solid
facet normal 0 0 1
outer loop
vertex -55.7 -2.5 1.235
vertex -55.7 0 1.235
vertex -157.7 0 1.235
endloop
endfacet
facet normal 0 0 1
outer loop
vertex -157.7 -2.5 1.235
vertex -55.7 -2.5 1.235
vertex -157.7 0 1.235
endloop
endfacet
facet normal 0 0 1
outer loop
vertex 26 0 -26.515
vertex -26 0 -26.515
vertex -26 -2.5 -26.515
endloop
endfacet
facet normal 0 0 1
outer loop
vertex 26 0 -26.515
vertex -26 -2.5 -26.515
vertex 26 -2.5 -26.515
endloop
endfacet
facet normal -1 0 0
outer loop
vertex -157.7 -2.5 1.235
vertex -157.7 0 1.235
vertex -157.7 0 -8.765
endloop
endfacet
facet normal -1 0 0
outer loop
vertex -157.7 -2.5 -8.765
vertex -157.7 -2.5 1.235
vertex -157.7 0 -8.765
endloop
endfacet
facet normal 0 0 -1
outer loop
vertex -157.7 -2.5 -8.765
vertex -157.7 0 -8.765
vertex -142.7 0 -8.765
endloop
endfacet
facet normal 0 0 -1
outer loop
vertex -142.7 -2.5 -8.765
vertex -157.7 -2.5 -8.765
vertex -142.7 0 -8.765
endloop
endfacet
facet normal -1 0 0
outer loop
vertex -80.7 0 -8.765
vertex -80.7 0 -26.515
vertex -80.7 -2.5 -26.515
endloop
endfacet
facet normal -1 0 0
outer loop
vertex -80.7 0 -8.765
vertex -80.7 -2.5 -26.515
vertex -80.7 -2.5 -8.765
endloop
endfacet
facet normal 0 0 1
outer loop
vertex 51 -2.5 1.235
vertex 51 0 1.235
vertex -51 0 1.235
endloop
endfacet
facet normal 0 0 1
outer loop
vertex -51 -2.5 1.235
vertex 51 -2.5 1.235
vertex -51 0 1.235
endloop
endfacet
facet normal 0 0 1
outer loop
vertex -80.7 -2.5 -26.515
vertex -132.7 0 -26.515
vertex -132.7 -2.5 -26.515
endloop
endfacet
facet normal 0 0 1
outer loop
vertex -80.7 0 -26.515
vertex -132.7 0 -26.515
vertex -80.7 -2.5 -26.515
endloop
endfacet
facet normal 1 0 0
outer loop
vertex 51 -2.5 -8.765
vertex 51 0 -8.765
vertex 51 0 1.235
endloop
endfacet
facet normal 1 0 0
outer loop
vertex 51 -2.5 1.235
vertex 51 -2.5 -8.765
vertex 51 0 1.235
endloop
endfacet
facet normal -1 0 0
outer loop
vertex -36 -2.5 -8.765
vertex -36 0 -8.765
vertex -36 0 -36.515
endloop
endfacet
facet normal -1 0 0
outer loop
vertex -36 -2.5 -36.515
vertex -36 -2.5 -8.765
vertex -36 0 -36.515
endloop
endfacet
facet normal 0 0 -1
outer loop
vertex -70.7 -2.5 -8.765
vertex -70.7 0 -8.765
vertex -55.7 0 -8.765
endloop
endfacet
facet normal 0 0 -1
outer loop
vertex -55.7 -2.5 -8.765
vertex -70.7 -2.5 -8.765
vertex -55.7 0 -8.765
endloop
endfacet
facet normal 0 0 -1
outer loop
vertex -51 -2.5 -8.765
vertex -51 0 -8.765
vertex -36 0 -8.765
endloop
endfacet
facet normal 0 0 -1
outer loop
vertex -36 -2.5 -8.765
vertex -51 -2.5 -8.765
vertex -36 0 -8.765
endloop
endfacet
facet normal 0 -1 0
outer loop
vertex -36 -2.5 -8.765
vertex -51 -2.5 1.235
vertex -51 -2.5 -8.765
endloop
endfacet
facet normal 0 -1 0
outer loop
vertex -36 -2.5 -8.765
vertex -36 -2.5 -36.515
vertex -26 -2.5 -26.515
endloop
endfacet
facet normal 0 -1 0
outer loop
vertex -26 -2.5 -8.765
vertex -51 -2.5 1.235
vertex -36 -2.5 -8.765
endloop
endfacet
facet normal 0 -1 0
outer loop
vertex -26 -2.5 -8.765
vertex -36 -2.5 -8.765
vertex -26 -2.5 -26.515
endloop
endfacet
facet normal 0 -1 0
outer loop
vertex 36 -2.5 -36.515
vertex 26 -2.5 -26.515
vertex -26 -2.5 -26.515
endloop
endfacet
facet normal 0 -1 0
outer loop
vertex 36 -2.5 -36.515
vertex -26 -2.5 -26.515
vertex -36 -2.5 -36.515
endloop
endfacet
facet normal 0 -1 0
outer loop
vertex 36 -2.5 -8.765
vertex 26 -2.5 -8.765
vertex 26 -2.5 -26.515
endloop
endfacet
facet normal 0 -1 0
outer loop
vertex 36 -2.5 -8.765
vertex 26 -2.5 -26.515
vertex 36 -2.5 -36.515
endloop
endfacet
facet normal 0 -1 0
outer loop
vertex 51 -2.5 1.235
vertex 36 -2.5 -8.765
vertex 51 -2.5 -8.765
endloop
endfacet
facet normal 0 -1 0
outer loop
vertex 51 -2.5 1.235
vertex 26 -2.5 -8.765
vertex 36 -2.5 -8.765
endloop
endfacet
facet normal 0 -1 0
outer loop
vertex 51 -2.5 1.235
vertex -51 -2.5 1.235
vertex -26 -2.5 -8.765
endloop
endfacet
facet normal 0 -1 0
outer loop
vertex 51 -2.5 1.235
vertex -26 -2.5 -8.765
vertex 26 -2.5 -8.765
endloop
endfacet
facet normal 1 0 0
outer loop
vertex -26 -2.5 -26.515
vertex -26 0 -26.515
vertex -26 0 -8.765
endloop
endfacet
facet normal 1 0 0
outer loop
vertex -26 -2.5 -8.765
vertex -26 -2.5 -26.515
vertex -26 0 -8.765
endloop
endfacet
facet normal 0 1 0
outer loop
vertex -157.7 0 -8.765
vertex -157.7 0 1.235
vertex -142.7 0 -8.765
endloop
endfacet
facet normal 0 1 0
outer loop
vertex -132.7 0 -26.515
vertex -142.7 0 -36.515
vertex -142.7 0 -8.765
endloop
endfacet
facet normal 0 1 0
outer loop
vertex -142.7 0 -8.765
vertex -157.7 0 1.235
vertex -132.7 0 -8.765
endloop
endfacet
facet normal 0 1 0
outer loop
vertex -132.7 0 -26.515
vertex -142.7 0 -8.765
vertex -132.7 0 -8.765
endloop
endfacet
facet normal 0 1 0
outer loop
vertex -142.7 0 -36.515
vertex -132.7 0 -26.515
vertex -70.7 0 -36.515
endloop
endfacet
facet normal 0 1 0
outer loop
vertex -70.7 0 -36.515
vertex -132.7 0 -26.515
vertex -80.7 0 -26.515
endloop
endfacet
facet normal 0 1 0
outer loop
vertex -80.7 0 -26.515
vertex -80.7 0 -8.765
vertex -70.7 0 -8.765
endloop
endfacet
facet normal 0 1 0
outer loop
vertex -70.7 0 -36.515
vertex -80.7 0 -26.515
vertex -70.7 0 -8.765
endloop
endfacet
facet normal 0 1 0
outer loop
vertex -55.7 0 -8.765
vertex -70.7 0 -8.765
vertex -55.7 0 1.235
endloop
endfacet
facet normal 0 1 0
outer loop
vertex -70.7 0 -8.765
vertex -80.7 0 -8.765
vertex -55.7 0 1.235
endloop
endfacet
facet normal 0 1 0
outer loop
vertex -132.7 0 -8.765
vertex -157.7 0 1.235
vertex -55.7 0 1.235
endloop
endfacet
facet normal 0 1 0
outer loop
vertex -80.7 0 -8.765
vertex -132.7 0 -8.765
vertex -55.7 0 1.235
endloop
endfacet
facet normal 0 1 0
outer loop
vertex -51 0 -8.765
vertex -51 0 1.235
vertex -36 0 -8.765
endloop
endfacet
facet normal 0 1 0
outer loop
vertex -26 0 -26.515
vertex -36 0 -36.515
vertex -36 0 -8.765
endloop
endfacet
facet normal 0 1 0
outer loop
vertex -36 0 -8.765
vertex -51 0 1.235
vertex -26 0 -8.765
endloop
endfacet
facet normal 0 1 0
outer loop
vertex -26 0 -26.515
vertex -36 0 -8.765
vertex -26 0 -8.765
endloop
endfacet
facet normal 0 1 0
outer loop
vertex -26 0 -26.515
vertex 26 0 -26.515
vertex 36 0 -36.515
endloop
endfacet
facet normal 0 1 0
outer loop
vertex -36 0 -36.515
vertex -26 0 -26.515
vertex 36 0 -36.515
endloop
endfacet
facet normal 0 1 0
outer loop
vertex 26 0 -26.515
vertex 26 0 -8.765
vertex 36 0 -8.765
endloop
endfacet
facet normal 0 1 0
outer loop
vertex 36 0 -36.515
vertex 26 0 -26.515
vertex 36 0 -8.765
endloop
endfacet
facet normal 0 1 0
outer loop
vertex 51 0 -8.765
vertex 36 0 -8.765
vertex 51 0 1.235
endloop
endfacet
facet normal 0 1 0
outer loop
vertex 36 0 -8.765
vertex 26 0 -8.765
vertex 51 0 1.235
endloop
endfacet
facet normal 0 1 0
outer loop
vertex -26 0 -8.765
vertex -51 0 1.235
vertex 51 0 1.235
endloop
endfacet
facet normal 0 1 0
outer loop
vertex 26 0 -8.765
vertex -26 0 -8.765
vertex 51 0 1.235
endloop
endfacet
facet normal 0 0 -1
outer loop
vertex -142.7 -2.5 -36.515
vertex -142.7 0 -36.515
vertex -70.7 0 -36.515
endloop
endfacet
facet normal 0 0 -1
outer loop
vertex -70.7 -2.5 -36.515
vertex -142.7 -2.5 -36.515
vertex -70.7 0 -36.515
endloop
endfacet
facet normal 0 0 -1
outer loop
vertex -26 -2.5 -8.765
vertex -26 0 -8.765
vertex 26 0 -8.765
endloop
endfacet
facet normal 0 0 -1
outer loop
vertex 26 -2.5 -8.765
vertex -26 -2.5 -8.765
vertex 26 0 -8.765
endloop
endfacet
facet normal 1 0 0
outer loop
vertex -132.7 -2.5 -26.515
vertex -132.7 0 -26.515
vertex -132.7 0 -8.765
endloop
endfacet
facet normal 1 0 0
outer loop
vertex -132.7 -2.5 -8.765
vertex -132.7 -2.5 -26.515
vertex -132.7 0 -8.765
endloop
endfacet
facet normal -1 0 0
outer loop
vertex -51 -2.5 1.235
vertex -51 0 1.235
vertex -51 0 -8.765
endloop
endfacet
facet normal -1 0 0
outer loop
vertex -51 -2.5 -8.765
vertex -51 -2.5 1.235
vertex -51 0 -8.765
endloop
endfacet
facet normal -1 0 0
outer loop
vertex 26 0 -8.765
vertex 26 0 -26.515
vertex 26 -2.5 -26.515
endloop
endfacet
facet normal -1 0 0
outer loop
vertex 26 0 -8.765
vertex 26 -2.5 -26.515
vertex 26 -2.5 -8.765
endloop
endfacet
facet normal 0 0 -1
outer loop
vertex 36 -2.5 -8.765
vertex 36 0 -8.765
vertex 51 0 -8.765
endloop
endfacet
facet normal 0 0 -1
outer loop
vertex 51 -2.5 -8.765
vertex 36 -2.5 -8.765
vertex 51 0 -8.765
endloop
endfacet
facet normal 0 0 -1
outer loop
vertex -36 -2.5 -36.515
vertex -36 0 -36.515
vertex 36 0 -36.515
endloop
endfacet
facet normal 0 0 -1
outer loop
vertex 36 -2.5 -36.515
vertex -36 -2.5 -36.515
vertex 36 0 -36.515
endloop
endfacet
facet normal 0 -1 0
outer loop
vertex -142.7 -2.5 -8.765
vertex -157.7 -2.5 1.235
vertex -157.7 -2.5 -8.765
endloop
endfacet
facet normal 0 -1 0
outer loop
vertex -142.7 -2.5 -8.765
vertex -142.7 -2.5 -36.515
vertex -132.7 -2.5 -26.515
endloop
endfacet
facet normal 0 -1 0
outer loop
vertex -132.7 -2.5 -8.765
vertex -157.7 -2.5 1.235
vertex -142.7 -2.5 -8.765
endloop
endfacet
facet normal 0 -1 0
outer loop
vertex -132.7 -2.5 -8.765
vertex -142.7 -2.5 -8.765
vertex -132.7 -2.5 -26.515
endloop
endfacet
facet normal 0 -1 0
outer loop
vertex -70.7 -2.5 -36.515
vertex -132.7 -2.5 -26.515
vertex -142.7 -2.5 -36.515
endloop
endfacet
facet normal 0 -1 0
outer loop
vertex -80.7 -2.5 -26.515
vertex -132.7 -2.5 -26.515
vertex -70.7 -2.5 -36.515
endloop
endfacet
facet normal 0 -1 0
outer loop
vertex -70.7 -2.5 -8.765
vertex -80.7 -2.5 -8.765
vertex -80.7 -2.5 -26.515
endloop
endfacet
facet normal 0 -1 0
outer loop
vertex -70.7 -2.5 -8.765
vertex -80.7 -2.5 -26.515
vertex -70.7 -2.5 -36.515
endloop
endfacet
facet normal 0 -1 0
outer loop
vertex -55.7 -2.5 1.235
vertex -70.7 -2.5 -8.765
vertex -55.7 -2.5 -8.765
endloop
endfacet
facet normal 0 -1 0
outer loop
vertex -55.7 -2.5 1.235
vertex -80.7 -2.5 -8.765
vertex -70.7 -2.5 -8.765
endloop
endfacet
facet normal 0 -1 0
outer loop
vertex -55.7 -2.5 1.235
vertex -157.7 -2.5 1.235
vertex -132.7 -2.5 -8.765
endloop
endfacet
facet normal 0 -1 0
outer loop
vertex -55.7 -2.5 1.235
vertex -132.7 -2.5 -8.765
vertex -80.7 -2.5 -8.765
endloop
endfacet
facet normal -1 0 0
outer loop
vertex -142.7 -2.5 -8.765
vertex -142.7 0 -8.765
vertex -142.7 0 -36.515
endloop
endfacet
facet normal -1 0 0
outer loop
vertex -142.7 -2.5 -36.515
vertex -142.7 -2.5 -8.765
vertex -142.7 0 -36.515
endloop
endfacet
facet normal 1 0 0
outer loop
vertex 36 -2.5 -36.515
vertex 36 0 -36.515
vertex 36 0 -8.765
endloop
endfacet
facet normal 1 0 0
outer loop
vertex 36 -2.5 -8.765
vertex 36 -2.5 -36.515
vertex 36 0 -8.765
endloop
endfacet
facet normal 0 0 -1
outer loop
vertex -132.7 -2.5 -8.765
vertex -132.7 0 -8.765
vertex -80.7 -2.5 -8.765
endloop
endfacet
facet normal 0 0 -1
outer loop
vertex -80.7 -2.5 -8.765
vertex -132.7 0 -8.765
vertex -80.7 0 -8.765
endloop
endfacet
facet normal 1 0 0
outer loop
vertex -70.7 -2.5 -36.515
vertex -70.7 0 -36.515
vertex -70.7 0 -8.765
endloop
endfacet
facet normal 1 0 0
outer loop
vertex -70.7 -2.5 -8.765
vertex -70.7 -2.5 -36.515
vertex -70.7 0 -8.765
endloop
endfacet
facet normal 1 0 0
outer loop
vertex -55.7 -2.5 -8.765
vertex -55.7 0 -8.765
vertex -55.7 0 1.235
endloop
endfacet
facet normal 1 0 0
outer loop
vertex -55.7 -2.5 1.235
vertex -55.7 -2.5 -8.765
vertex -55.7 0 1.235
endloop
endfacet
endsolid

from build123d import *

# Parameters (mm, degrees)
F0_W     = 52
F0_H     = 17.75
F1_DEPTH = 2.5


with BuildPart() as f1:
    # F0 (on Front) → F1 (new body)
    with BuildSketch(Plane.XZ):
        Polygon((-36, -8.764741), (-36, -36.514741), (36, -36.514741), (36, -8.764741), (51, -8.764741), (51, 1.235259), (26, 1.235259), (-26, 1.235259), (-51, 1.235259), (-51, -8.764741), align=None)
        with Locations((0, -17.639741)):
            Rectangle(F0_W, F0_H, mode=Mode.SUBTRACT)
        Polygon((-157.7, -8.764741), (-142.7, -8.764741), (-142.7, -36.514741), (-70.7, -36.514741), (-70.7, -8.764741), (-55.7, -8.764741), (-55.7, 1.235259), (-157.7, 1.235259), align=None)
        with Locations((-106.7, -17.639741)):
            Rectangle(F0_W, F0_H, mode=Mode.SUBTRACT)
    extrude(amount=F1_DEPTH)


solid = f1.part
